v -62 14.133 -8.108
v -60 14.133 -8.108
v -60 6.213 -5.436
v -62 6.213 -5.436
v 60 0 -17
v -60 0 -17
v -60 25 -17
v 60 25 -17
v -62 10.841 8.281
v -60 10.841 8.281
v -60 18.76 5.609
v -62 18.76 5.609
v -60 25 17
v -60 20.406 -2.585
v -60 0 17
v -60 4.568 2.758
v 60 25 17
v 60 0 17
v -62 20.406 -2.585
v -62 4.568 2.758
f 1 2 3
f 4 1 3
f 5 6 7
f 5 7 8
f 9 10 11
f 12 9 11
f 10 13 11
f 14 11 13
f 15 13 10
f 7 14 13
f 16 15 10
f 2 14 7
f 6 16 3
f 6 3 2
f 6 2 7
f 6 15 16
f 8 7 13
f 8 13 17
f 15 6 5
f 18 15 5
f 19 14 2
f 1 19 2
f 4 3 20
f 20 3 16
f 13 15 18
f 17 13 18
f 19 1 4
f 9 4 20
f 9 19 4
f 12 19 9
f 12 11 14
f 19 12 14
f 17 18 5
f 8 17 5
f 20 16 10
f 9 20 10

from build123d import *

# Parameters (mm, degrees)
SKETCH1_W           = 120
SKETCH1_H           = 34
BOSS_EXTRUDE1_DEPTH = 25
BOSS_EXTRUDE2_DEPTH = 2


with BuildPart() as part:
    # Sketch1 → Boss-Extrude1 (new body)
    with BuildSketch(Plane(origin=(0, 0, 0), x_dir=(1, 0, 0), z_dir=(0, 1, 0))):
        Rectangle(SKETCH1_W, SKETCH1_H)
    extrude(amount=BOSS_EXTRUDE1_DEPTH)

    # Sketch2 → Boss-Extrude2 (add)
    with BuildSketch(Plane.ZY.offset(60)):
        Polygon((8.280528472, 10.841133841), (5.608754496, 18.760489421), (-2.585495606, 20.406343074), (-8.107971731, 14.132841147), (-5.436197754, 6.213485568), (2.758052347, 4.567631915), align=None)
    extrude(amount=BOSS_EXTRUDE2_DEPTH)


solid = part.part
